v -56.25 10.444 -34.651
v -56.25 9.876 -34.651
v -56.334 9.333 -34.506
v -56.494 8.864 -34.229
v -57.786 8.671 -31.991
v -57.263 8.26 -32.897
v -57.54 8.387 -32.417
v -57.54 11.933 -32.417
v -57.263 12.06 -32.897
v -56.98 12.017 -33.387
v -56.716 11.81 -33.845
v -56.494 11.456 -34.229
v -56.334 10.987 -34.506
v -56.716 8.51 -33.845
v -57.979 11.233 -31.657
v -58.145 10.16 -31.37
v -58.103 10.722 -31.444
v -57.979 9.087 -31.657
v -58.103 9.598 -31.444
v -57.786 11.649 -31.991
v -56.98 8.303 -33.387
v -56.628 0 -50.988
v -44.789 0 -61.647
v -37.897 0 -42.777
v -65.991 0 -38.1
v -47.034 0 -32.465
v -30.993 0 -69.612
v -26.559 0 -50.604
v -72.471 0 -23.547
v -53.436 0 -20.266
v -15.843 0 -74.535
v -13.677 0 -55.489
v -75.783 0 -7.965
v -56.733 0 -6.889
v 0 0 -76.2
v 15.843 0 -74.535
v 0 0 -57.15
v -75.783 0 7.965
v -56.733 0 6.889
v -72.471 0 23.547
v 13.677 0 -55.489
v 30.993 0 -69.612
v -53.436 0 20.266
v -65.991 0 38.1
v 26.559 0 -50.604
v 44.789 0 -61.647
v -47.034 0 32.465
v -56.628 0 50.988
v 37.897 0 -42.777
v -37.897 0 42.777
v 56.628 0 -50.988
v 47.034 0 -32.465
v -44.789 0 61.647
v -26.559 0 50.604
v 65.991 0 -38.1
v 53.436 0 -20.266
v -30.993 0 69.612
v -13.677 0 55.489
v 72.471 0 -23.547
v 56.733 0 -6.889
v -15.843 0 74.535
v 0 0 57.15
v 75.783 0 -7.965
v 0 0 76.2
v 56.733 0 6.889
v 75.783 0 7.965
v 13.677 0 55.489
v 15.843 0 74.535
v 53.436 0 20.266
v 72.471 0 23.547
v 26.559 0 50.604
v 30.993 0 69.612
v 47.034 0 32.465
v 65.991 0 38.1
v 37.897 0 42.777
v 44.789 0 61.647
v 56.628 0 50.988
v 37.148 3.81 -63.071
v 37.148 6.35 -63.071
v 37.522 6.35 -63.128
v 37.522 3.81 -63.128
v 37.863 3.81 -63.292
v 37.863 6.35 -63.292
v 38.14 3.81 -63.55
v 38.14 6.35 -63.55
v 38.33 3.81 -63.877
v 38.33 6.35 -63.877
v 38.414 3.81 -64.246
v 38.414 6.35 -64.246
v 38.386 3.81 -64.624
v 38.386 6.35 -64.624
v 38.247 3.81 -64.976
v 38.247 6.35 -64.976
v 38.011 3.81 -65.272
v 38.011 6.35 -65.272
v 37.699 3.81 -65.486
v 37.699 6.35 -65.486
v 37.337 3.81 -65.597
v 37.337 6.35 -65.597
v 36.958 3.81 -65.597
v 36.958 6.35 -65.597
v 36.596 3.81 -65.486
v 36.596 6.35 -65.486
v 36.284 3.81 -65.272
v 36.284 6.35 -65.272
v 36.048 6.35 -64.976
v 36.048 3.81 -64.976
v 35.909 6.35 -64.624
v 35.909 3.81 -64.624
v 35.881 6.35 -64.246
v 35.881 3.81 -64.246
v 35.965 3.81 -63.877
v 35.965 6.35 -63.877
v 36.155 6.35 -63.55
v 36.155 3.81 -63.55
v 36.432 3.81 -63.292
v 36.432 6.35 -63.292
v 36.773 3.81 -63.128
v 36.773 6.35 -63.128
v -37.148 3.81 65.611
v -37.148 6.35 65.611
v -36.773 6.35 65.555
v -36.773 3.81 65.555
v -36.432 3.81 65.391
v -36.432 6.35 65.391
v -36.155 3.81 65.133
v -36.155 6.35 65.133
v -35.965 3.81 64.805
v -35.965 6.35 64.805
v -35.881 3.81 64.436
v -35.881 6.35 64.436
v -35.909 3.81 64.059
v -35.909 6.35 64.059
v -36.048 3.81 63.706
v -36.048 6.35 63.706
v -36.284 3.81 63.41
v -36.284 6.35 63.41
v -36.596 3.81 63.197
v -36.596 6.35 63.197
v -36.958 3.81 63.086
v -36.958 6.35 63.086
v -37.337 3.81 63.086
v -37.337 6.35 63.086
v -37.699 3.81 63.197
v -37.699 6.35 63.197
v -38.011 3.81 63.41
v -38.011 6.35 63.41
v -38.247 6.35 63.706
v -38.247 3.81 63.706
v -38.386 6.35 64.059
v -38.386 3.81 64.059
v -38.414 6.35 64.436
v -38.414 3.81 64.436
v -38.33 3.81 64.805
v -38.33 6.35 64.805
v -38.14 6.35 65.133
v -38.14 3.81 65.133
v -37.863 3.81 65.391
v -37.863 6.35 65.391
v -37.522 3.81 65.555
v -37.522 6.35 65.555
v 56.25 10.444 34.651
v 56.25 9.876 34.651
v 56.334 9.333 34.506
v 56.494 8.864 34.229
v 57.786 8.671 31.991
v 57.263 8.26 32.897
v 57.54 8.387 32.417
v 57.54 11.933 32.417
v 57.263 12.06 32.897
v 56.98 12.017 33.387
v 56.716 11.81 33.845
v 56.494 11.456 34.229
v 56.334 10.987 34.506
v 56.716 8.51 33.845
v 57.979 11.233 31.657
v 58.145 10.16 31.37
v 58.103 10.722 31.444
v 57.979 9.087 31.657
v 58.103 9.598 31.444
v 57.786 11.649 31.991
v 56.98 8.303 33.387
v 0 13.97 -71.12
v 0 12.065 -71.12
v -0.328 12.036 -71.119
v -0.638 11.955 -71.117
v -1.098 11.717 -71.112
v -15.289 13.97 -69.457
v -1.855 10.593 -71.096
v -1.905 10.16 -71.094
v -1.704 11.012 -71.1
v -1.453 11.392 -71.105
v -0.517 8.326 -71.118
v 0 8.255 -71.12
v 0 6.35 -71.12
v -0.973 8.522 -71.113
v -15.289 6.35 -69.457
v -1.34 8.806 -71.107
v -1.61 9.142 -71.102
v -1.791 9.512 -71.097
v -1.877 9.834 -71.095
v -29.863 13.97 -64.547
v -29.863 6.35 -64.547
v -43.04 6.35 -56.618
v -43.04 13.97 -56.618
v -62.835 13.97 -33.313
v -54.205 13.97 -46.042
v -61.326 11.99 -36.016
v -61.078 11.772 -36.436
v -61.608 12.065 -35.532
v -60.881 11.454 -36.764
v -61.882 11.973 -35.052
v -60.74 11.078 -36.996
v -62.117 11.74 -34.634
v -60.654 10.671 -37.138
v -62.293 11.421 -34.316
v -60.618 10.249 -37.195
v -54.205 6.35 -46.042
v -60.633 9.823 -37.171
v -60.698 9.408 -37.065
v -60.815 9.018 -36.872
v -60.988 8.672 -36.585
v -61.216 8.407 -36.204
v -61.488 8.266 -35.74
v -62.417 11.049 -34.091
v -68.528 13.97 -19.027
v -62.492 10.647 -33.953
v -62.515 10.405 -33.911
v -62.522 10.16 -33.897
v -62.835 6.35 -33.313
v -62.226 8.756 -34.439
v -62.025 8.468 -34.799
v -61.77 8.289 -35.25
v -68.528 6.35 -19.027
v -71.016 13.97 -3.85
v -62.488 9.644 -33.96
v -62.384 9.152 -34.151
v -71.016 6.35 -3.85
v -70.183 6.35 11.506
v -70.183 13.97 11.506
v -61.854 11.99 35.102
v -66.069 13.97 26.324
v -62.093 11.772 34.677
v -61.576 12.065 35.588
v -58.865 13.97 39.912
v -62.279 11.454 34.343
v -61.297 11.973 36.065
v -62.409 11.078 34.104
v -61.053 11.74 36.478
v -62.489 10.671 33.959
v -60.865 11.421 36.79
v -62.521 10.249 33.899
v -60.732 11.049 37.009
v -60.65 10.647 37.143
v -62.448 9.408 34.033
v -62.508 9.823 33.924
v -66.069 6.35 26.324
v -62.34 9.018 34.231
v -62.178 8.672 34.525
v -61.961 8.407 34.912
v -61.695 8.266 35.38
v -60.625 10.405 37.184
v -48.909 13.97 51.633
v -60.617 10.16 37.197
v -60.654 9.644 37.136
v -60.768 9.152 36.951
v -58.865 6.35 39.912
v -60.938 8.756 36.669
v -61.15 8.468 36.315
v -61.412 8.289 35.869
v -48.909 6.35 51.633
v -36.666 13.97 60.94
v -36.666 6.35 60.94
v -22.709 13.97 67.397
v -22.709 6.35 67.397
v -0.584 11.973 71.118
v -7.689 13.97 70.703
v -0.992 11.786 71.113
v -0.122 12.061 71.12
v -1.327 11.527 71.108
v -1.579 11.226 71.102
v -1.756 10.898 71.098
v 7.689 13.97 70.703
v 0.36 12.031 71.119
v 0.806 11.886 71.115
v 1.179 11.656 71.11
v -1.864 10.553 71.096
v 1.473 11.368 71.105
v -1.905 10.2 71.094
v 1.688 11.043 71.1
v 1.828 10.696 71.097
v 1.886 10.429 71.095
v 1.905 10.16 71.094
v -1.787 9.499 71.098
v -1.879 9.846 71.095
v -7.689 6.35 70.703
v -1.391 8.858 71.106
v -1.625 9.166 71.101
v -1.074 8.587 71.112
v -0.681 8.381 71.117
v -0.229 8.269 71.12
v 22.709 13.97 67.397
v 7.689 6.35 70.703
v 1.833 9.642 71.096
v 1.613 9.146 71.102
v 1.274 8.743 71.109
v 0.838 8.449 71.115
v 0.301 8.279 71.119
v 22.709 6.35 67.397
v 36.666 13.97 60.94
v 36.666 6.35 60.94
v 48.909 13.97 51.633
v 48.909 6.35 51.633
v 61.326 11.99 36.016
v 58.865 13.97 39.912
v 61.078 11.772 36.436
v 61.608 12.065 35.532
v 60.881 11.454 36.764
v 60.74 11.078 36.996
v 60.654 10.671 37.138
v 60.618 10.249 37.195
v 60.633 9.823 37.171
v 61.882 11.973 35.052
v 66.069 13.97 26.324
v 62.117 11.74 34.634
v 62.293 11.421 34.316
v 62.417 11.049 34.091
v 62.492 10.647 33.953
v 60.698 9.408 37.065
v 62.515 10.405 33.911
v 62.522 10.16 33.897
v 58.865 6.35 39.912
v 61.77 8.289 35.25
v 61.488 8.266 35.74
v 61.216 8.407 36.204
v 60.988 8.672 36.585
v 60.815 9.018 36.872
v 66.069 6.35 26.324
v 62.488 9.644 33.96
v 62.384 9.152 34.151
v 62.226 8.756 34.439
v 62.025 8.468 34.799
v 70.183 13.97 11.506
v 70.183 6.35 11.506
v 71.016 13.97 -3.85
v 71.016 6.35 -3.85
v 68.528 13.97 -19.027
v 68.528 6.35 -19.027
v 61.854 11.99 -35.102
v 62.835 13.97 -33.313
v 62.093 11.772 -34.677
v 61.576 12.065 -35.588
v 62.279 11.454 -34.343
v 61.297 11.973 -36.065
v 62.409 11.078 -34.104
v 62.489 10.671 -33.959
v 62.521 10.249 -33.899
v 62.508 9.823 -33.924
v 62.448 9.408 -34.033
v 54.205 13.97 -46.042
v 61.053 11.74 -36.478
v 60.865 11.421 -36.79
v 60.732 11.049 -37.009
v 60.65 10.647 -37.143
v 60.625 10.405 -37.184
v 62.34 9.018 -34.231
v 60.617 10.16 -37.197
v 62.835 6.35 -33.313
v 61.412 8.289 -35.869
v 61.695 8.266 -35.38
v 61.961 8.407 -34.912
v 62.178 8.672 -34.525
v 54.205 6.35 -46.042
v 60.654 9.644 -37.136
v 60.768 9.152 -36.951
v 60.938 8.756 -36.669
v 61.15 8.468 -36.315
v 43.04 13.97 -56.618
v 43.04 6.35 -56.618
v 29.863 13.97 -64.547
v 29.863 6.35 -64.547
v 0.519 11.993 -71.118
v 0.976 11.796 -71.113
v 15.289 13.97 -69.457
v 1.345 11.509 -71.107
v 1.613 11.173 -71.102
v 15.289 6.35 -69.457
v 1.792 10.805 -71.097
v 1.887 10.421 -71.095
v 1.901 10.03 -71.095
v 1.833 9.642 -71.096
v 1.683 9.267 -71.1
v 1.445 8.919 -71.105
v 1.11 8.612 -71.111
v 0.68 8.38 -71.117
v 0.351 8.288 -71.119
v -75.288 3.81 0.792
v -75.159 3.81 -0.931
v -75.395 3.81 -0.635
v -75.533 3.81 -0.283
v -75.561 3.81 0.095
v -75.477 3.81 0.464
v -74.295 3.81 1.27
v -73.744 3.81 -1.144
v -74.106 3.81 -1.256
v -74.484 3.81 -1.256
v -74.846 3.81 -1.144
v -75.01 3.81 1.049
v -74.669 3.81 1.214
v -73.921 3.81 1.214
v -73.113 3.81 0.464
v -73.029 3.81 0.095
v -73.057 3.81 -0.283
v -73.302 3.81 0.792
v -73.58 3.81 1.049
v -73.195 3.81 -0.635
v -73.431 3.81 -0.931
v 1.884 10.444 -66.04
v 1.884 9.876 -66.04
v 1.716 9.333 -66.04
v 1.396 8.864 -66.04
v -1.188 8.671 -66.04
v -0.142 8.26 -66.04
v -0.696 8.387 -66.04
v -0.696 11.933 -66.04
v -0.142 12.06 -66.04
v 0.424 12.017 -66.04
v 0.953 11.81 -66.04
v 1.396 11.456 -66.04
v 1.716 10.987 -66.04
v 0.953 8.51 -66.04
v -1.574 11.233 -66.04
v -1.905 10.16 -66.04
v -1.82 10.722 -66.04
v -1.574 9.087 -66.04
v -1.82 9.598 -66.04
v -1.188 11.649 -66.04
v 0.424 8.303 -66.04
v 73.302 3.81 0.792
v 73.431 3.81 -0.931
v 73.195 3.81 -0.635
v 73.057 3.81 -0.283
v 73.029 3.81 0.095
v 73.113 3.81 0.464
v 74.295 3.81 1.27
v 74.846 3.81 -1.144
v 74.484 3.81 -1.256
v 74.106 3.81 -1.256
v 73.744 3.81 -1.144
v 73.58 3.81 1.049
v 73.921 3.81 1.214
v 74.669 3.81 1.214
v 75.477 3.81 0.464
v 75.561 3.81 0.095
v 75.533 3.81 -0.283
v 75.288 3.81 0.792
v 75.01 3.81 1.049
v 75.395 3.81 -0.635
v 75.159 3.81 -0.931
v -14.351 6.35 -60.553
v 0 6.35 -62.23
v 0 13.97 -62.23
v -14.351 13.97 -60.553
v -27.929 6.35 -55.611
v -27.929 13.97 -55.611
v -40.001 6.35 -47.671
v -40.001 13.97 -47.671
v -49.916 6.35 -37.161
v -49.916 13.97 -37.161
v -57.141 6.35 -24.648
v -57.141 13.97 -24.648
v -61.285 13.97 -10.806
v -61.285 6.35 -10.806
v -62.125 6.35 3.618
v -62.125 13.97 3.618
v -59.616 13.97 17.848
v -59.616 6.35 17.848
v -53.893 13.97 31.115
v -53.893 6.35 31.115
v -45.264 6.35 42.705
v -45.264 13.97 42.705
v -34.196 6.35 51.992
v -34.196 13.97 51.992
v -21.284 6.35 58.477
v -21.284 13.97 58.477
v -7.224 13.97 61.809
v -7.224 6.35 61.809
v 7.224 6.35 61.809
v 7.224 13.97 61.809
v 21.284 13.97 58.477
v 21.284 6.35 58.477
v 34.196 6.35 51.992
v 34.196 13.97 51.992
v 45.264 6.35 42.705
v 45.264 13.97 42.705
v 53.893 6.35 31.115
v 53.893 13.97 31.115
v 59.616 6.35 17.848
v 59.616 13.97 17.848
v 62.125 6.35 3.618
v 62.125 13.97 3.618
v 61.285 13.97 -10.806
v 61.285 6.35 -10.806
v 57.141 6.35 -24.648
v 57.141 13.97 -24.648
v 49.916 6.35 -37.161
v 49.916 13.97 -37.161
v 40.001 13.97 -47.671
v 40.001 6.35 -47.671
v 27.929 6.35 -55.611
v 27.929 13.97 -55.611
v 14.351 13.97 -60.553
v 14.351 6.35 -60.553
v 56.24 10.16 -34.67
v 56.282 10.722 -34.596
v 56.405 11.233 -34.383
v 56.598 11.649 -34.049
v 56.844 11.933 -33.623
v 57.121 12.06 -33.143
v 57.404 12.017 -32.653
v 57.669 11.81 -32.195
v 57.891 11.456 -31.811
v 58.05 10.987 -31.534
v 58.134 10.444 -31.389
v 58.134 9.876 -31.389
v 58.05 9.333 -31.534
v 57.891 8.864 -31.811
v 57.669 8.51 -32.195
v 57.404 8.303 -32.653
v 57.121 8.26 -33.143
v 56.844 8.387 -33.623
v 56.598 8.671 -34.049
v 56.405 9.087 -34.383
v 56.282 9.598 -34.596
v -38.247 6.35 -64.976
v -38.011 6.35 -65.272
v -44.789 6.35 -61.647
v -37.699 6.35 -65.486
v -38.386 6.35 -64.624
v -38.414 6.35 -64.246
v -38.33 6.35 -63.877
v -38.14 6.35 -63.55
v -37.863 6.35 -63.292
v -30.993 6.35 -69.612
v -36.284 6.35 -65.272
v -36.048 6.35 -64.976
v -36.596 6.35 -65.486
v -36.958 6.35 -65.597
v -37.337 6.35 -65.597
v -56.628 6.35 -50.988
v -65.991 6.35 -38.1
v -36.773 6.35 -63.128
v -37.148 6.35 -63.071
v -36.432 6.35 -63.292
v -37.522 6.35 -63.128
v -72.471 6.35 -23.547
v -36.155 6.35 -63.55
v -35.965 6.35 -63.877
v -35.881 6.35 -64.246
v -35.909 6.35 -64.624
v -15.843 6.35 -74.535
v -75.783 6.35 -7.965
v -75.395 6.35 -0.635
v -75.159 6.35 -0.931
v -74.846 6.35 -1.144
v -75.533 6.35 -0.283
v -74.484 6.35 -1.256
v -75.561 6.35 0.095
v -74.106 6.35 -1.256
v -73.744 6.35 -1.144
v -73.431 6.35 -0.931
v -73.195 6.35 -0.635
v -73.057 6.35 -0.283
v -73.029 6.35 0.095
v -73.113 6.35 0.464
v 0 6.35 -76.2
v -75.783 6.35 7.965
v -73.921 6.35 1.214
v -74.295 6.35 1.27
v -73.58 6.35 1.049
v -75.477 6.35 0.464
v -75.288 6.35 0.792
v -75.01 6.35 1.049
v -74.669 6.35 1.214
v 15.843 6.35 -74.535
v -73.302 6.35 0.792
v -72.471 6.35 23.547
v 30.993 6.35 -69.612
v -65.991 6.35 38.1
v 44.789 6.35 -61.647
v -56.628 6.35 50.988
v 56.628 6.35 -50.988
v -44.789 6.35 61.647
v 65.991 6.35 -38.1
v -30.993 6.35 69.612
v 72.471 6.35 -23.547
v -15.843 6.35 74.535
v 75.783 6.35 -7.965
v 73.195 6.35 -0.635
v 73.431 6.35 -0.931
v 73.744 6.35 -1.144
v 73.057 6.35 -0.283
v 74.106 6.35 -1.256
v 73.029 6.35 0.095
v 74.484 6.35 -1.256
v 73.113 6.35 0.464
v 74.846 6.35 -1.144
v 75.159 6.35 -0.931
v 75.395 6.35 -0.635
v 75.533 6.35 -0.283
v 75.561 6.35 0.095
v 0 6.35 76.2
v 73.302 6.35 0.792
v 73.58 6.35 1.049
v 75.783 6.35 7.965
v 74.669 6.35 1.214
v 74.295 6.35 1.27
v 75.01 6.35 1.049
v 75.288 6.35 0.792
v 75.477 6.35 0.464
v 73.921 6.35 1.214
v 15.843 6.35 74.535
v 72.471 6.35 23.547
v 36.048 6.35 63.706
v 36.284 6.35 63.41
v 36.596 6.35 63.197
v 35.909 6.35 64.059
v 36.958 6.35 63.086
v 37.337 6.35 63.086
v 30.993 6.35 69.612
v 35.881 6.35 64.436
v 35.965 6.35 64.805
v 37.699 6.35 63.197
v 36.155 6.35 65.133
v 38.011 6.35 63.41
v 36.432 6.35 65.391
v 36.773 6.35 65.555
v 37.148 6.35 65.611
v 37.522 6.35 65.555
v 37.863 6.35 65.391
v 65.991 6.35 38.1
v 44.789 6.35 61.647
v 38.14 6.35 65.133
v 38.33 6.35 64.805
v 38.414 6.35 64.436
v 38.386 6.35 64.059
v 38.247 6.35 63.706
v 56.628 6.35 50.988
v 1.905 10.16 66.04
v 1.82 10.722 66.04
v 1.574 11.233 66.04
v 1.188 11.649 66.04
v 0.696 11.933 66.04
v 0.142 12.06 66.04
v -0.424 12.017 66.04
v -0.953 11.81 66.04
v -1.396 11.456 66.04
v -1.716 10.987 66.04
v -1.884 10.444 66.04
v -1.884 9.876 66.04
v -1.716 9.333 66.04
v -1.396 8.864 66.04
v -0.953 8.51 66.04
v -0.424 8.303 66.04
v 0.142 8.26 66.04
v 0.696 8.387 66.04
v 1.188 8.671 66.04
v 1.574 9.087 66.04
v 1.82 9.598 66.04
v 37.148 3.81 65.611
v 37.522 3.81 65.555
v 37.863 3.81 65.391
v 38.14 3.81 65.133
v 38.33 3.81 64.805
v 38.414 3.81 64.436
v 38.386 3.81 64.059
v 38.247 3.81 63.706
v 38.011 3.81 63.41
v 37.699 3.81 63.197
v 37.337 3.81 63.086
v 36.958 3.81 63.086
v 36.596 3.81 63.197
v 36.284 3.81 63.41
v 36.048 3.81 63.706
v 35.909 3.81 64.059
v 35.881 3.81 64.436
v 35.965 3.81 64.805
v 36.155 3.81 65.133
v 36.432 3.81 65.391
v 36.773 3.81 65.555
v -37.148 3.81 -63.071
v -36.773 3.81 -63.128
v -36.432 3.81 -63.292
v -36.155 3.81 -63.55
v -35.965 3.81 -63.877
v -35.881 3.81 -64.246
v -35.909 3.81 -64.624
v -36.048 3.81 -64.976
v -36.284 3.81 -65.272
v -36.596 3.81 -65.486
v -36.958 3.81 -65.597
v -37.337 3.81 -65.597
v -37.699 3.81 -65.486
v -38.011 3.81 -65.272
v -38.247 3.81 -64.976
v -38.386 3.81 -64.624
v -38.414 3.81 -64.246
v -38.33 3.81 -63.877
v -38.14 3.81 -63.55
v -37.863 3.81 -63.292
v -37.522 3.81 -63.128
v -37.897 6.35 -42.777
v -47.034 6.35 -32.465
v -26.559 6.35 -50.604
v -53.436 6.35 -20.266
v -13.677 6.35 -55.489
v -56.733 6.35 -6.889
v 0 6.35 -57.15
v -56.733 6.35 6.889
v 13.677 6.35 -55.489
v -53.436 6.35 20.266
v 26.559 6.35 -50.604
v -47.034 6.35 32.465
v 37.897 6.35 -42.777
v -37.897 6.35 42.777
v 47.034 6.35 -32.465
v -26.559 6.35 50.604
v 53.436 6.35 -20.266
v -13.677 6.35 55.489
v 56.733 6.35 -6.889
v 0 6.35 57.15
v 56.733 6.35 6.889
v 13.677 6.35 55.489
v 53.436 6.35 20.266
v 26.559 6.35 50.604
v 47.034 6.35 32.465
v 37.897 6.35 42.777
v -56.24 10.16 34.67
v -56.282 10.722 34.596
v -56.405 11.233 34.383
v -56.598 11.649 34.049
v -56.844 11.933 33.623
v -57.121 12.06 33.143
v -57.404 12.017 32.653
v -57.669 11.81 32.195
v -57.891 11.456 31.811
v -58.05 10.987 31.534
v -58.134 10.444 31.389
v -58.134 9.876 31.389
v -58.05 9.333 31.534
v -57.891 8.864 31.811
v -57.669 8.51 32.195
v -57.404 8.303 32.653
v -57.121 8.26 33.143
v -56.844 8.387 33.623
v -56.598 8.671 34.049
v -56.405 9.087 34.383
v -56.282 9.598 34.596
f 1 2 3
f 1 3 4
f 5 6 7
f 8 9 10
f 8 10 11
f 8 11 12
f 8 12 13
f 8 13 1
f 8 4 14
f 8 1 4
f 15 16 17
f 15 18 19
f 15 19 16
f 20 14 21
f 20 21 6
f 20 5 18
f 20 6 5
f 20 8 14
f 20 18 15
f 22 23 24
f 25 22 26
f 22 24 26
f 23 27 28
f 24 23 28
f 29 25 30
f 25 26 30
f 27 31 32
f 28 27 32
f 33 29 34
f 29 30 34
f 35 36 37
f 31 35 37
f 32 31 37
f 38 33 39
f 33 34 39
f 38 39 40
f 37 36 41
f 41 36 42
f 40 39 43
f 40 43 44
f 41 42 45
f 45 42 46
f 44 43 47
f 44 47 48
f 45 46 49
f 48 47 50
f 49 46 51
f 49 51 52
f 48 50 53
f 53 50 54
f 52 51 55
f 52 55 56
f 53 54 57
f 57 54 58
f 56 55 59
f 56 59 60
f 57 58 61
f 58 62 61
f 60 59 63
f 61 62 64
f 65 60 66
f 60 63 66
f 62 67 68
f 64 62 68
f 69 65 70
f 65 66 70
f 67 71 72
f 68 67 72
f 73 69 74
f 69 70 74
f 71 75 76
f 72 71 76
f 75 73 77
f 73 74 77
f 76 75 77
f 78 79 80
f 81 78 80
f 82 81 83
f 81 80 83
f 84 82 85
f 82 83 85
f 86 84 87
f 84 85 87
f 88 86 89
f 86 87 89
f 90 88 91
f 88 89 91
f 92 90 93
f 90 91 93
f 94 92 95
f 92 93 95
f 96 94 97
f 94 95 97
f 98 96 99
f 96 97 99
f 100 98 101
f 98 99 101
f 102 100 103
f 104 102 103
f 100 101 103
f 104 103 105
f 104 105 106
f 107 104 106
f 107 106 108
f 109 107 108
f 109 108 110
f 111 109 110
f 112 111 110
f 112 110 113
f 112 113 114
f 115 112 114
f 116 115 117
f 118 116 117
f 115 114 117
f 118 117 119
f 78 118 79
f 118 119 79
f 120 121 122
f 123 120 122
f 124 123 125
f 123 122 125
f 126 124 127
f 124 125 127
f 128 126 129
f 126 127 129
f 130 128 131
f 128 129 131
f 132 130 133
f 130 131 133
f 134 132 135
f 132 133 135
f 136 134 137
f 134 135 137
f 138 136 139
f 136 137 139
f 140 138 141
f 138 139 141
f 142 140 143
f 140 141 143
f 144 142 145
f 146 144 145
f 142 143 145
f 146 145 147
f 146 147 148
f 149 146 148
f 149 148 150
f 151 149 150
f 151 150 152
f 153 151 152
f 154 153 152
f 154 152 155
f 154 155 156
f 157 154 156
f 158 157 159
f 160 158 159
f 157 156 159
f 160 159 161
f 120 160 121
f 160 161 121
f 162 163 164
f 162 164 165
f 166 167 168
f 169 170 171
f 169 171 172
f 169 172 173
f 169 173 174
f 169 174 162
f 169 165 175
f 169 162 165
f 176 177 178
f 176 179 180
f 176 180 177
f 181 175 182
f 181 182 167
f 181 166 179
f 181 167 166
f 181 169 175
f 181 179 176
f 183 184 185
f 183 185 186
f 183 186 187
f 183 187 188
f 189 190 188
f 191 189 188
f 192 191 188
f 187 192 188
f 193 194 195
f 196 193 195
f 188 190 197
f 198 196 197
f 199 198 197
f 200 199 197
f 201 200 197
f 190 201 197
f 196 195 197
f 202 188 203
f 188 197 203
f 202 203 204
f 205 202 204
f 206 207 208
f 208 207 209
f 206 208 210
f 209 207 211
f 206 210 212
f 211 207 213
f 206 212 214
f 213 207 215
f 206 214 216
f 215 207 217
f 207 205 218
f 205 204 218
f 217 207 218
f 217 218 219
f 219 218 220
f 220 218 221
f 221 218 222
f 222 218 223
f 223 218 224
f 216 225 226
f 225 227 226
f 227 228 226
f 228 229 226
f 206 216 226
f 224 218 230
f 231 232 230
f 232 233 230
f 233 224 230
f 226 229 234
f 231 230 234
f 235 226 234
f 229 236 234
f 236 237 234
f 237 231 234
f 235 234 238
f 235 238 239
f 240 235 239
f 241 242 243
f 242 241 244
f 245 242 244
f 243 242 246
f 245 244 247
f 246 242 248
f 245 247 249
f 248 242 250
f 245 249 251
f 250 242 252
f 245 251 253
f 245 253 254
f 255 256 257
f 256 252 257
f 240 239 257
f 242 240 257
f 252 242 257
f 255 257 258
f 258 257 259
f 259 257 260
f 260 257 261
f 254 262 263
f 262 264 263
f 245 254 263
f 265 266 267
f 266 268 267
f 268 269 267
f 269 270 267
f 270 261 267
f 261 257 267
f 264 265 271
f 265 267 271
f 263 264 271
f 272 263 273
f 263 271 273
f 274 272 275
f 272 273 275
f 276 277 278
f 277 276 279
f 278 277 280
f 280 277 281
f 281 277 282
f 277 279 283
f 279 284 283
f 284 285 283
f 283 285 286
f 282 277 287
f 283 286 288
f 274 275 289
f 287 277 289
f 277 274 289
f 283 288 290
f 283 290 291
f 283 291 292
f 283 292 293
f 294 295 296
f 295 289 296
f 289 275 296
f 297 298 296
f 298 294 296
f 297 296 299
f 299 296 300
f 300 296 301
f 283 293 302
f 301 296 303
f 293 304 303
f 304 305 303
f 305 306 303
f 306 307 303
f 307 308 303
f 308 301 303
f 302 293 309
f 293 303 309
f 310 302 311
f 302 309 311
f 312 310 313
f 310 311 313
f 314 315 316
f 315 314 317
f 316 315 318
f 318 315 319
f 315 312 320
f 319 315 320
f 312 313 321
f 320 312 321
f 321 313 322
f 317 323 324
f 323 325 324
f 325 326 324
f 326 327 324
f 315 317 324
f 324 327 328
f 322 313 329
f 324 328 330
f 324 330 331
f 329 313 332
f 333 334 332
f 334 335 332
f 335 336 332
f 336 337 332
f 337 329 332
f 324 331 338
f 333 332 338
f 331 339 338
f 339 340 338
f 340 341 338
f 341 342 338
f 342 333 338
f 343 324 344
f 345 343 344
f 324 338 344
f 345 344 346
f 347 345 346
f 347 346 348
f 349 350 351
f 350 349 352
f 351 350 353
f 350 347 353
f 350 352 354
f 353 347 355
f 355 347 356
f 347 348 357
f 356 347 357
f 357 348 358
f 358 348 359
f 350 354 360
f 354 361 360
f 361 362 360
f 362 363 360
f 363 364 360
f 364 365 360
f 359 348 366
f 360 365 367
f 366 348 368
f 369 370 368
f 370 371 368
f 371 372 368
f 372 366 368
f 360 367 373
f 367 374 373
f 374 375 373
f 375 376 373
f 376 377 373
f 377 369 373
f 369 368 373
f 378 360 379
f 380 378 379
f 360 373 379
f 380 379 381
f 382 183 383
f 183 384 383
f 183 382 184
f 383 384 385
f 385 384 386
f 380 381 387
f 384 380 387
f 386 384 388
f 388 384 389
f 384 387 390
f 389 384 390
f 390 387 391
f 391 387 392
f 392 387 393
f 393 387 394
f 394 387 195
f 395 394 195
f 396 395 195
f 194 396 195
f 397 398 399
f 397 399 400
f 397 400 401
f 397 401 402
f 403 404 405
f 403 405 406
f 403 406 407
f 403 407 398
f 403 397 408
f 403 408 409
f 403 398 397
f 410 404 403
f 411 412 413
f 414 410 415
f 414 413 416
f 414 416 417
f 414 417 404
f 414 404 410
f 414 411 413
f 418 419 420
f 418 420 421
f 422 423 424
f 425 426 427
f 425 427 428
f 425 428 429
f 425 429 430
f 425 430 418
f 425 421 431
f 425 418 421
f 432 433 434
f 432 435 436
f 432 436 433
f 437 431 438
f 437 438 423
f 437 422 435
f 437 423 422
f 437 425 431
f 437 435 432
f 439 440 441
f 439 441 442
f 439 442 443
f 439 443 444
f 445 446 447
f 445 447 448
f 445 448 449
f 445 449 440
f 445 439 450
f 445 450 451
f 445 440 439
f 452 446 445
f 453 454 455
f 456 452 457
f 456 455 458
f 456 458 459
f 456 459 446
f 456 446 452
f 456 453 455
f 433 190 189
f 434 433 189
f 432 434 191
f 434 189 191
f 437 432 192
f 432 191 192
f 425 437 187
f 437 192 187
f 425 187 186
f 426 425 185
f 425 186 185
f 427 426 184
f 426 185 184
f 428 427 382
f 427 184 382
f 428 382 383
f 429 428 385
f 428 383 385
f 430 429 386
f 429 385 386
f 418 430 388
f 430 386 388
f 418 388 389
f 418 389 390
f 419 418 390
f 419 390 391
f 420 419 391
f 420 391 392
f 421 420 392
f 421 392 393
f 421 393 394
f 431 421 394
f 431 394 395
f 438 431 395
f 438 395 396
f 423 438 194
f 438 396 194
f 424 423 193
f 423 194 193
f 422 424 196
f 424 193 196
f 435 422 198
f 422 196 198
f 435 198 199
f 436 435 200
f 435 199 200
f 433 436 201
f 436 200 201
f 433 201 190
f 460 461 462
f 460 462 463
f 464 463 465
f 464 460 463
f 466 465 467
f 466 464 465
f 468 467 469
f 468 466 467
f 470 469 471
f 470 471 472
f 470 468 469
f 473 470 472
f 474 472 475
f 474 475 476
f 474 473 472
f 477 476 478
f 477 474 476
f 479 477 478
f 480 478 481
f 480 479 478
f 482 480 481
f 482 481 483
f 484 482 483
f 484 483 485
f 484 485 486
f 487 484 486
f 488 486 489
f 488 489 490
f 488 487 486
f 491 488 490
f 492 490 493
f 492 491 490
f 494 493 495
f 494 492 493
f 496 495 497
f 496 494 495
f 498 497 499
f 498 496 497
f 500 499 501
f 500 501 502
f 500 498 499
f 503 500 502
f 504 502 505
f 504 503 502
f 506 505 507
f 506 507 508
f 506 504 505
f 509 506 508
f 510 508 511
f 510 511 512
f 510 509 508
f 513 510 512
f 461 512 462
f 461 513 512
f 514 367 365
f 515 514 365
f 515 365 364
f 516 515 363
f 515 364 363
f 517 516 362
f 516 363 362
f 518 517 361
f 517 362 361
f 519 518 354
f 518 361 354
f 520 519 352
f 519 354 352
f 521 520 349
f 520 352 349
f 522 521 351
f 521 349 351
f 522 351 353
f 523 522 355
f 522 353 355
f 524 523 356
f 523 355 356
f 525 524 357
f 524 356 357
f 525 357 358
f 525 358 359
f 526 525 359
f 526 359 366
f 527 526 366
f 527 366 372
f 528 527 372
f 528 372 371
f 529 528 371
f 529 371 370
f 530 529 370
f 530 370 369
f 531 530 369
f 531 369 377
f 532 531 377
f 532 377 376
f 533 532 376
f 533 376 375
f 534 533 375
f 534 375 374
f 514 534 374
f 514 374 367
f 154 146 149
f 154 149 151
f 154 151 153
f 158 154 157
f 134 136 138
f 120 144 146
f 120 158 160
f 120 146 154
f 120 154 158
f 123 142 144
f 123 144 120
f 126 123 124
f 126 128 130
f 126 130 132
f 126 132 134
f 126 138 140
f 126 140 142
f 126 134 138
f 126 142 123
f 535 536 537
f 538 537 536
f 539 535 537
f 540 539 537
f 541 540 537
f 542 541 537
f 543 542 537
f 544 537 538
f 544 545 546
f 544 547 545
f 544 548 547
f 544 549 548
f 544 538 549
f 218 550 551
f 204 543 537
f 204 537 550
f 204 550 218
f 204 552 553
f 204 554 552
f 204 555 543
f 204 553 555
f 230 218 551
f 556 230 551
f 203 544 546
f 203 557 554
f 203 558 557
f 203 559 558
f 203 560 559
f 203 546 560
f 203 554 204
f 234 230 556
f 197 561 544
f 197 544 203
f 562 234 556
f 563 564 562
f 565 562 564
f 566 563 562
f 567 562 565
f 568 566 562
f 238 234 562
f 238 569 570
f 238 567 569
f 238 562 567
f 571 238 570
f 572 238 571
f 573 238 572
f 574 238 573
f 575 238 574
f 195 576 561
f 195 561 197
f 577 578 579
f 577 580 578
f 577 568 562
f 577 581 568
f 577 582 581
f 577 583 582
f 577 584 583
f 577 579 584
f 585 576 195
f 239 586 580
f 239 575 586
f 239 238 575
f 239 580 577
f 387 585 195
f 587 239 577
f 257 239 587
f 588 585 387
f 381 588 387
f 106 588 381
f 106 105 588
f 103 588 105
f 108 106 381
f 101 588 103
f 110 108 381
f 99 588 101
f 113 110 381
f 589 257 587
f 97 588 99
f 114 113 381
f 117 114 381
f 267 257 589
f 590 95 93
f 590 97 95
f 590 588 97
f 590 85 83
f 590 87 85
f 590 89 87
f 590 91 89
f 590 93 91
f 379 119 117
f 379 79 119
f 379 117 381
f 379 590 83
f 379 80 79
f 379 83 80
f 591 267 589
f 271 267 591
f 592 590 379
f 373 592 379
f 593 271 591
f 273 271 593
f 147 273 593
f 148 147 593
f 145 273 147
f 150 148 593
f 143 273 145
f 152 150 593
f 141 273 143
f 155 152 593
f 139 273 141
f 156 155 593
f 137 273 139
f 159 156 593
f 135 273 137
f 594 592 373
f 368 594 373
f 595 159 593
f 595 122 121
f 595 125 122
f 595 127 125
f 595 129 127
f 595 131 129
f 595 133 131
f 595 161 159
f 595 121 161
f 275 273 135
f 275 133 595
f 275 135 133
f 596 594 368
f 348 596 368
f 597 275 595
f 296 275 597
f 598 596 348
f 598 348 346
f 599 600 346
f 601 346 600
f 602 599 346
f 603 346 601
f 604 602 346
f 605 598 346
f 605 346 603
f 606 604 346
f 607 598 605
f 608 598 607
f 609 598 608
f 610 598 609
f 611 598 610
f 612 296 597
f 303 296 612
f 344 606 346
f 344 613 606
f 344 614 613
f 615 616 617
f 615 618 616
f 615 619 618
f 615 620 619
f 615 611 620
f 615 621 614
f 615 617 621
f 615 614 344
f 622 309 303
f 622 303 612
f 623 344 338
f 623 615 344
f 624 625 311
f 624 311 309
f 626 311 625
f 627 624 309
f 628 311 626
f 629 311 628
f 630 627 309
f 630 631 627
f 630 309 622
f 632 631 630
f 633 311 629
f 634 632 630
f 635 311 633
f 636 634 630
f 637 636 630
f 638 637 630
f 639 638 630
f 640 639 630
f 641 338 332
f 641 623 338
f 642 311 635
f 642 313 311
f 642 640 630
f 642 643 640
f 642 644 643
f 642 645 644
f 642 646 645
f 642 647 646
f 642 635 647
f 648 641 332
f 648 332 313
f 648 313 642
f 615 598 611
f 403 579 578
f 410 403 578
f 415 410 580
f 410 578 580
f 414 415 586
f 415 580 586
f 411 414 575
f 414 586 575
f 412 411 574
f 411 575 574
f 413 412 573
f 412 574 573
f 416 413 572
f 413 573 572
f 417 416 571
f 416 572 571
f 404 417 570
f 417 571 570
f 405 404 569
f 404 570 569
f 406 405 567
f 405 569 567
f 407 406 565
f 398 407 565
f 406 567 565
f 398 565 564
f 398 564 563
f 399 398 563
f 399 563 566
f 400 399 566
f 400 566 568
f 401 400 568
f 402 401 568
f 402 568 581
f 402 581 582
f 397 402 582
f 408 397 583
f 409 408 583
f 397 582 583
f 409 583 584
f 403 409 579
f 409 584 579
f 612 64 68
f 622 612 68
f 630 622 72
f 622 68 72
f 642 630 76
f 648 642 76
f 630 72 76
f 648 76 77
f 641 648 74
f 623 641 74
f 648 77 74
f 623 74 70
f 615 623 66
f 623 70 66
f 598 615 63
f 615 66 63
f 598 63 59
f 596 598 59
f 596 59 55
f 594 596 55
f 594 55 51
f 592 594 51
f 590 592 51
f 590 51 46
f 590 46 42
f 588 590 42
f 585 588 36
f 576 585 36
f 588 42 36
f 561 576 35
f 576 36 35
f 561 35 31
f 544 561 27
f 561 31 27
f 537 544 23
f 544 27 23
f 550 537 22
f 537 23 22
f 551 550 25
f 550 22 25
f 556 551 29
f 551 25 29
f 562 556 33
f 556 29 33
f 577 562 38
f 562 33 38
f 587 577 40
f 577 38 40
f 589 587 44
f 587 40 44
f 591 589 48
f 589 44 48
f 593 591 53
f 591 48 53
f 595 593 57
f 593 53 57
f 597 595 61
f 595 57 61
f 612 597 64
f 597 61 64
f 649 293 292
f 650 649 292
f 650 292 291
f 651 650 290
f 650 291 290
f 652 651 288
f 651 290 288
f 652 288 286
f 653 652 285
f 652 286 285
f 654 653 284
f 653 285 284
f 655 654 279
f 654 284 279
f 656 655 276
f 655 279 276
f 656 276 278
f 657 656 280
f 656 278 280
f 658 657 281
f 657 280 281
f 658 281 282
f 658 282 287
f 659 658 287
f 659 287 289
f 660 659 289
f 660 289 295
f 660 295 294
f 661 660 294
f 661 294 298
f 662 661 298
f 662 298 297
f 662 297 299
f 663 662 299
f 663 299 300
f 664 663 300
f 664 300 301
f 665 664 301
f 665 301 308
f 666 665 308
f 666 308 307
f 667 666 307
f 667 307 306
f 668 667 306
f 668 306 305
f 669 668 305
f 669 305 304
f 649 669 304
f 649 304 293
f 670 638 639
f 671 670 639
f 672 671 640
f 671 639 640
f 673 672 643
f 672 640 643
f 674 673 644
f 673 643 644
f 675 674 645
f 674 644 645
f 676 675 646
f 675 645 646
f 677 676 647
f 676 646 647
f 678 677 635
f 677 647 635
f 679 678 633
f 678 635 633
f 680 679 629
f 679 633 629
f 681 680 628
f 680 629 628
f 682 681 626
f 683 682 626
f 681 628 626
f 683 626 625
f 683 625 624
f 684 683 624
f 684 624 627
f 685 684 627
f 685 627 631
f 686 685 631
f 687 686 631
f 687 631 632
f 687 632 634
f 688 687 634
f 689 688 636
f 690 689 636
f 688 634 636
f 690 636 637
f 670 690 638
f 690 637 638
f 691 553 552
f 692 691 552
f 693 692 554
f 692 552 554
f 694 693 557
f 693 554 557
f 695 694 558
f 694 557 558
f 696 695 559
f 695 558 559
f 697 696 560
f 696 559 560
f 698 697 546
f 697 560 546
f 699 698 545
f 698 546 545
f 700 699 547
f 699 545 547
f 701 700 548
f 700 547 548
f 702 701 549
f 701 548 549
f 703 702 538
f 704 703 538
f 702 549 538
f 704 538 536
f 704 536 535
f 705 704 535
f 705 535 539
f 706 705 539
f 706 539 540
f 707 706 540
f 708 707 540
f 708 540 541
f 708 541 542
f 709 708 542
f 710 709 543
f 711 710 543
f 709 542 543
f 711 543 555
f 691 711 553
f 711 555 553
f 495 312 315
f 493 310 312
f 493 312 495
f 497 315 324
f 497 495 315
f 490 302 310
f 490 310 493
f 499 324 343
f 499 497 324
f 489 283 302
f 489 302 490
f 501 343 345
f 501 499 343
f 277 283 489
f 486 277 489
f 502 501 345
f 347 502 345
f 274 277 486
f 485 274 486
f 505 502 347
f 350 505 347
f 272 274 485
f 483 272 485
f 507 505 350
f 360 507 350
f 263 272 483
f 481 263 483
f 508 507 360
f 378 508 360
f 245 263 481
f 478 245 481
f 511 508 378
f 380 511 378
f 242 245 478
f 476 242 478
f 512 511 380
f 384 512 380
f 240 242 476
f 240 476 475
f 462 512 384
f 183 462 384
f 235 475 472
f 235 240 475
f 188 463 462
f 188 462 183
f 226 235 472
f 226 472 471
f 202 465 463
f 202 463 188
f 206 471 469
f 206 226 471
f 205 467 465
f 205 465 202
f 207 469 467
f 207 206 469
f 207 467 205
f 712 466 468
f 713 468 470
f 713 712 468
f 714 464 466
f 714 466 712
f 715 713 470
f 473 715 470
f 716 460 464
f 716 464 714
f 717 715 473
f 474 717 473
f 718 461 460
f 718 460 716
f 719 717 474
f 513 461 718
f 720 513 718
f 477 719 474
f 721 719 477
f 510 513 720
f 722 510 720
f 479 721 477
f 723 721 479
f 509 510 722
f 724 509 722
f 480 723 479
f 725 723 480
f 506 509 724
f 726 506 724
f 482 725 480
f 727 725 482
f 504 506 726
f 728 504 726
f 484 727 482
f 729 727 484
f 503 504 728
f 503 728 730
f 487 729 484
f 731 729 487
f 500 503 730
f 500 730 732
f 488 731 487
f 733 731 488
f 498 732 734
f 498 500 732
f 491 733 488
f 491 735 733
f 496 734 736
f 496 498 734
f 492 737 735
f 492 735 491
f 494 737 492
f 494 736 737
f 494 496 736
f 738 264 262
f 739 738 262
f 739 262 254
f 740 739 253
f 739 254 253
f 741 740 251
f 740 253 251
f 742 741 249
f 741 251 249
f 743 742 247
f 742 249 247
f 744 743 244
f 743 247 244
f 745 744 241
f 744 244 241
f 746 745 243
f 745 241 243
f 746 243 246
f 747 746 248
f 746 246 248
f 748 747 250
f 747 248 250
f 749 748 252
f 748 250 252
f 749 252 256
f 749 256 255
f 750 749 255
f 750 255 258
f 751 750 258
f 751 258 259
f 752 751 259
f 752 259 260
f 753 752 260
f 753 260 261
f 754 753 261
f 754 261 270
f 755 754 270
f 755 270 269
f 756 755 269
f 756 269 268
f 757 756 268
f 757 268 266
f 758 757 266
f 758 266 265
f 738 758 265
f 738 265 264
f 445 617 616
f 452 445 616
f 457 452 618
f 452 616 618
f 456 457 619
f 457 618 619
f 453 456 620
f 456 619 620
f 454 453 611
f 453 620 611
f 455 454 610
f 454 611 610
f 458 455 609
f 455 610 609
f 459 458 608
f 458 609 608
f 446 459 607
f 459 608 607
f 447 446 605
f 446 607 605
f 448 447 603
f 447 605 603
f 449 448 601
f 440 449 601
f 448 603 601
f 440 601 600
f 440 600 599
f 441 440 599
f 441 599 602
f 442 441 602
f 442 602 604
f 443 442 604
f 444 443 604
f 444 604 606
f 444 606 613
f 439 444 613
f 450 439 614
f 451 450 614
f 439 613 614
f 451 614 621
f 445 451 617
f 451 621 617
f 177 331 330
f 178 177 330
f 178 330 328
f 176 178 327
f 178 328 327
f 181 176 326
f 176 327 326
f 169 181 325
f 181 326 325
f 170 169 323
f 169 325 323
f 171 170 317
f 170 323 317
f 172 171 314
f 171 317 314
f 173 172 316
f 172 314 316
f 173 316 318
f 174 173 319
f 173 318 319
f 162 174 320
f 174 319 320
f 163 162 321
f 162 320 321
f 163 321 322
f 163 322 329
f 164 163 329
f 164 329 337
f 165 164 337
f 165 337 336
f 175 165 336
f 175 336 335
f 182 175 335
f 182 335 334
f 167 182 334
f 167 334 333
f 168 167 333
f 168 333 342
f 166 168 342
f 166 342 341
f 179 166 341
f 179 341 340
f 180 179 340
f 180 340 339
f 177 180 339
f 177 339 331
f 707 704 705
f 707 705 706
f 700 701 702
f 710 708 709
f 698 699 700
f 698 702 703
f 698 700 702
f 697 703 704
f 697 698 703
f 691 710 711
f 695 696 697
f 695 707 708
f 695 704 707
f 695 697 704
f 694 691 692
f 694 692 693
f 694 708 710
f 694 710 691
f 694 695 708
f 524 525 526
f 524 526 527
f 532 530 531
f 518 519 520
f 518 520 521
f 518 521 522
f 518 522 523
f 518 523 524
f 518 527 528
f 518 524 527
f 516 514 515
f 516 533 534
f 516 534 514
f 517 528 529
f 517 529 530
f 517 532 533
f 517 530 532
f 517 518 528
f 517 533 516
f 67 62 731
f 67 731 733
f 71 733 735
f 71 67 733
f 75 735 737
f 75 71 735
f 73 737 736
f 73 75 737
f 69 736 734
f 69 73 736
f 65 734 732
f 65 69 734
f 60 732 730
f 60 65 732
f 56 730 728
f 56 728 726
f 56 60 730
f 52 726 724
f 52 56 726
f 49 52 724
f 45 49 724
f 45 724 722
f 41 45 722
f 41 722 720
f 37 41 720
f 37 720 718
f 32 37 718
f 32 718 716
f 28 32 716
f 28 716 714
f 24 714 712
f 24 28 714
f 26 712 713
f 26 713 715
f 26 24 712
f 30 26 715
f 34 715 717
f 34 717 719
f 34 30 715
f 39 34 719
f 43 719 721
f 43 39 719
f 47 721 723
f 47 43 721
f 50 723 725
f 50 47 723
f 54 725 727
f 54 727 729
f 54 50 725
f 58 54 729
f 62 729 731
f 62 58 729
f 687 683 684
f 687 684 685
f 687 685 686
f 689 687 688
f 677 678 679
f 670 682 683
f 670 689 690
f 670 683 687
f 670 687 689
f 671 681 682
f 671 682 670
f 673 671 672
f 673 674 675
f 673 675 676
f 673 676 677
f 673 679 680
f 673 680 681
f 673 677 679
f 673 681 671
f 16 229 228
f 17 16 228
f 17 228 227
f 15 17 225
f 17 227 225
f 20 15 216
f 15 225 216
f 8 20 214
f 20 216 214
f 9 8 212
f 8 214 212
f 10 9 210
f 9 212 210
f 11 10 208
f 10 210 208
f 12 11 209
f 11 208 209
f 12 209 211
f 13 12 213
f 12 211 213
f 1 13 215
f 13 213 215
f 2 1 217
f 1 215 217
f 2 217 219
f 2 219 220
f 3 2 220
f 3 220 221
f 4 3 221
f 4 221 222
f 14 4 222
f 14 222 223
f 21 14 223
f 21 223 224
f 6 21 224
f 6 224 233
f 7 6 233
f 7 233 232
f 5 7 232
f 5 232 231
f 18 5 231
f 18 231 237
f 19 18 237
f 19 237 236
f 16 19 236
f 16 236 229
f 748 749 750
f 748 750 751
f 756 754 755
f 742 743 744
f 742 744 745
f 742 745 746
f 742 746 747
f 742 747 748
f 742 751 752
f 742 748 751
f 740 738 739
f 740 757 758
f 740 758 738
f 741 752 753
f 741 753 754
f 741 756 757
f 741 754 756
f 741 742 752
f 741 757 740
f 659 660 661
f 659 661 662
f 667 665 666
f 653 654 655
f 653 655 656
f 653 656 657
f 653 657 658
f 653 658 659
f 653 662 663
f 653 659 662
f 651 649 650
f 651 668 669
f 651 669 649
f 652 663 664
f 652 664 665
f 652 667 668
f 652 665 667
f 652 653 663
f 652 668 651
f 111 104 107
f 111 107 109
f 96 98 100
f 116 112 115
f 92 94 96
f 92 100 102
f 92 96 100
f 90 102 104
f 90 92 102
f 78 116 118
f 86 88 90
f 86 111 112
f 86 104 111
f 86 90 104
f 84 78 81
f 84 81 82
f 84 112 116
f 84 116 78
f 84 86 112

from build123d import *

# Parameters (mm, degrees)
SKETCH1_R           = 76.2
SKETCH1_R_2         = 57.15
BOSS_EXTRUDE1_DEPTH = 6.35
SKETCH2_R           = 71.12
SKETCH2_R_2         = 62.23
BOSS_EXTRUDE2_DEPTH = 7.62
SKETCH4_R           = 1.905
CUT_EXTRUDE1_DEPTH  = 5.08
CIRPATTERN1_COUNT   = 6
SKETCH7_R           = 1.27
CUT_EXTRUDE2_DEPTH  = 2.54


with BuildPart() as part:
    # Sketch1 → Boss-Extrude1 (new body)
    with BuildSketch(Plane(origin=(0, 0, 0), x_dir=(1, 0, 0), z_dir=(0, 1, 0))):
        with Locations(Location((0, 0, 0), (0, 0, 270))):
            Circle(SKETCH1_R)
        with Locations(Location((0, 0, 0), (0, 0, 270))):
            Circle(SKETCH1_R_2, mode=Mode.SUBTRACT)
    extrude(amount=BOSS_EXTRUDE1_DEPTH)

    # Sketch2 → Boss-Extrude2 (add)
    with BuildSketch(Plane(origin=(0, 6.35, 0), x_dir=(1, 0, 0), z_dir=(0, 1, 0))):
        with Locations(Location((0, 0, 0), (0, 0, 90))):
            Circle(SKETCH2_R)
        with Locations(Location((0, 0, 0), (0, 0, 90))):
            Circle(SKETCH2_R_2, mode=Mode.SUBTRACT)
    extrude(amount=BOSS_EXTRUDE2_DEPTH)

    # Sketch4 → Cut-Extrude1 (cut)
    with BuildSketch(Plane.XY.offset(71.12)):
        with Locations((0, 10.16)):
            Circle(SKETCH4_R)
    cut_extrude1 = extrude(amount=-CUT_EXTRUDE1_DEPTH, mode=Mode.SUBTRACT)

    # CirPattern1: Cut-Extrude1 ×6 about axis
    cirpattern1_axis = Axis((0, 0, 0), (0, 1, 0))
    for i in range(1, CIRPATTERN1_COUNT):
        add(cut_extrude1.rotate(cirpattern1_axis, i * 360 / CIRPATTERN1_COUNT), mode=Mode.SUBTRACT)

    # Sketch7 → Cut-Extrude2 (cut)
    with BuildSketch(Plane(origin=(0, 6.35, 0), x_dir=(1, 0, 0), z_dir=(0, 1, 0))):
        with Locations(Location((37.1475, 64.341357374, 0), (0, 0, 270))):
            Circle(SKETCH7_R)
        with Locations(Location((74.295, 0, 0), (0, 0, 270))):
            Circle(SKETCH7_R)
        with Locations(Location((37.1475, -64.341357374, 0), (0, 0, 270))):
            Circle(SKETCH7_R)
        with Locations(Location((-37.1475, -64.341357374, 0), (0, 0, 270))):
            Circle(SKETCH7_R)
        with Locations(Location((-74.295, 0, 0), (0, 0, 270))):
            Circle(SKETCH7_R)
        with Locations(Location((-37.1475, 64.341357374, 0), (0, 0, 270))):
            Circle(SKETCH7_R)
    extrude(amount=-CUT_EXTRUDE2_DEPTH, mode=Mode.SUBTRACT)


solid = part.part
